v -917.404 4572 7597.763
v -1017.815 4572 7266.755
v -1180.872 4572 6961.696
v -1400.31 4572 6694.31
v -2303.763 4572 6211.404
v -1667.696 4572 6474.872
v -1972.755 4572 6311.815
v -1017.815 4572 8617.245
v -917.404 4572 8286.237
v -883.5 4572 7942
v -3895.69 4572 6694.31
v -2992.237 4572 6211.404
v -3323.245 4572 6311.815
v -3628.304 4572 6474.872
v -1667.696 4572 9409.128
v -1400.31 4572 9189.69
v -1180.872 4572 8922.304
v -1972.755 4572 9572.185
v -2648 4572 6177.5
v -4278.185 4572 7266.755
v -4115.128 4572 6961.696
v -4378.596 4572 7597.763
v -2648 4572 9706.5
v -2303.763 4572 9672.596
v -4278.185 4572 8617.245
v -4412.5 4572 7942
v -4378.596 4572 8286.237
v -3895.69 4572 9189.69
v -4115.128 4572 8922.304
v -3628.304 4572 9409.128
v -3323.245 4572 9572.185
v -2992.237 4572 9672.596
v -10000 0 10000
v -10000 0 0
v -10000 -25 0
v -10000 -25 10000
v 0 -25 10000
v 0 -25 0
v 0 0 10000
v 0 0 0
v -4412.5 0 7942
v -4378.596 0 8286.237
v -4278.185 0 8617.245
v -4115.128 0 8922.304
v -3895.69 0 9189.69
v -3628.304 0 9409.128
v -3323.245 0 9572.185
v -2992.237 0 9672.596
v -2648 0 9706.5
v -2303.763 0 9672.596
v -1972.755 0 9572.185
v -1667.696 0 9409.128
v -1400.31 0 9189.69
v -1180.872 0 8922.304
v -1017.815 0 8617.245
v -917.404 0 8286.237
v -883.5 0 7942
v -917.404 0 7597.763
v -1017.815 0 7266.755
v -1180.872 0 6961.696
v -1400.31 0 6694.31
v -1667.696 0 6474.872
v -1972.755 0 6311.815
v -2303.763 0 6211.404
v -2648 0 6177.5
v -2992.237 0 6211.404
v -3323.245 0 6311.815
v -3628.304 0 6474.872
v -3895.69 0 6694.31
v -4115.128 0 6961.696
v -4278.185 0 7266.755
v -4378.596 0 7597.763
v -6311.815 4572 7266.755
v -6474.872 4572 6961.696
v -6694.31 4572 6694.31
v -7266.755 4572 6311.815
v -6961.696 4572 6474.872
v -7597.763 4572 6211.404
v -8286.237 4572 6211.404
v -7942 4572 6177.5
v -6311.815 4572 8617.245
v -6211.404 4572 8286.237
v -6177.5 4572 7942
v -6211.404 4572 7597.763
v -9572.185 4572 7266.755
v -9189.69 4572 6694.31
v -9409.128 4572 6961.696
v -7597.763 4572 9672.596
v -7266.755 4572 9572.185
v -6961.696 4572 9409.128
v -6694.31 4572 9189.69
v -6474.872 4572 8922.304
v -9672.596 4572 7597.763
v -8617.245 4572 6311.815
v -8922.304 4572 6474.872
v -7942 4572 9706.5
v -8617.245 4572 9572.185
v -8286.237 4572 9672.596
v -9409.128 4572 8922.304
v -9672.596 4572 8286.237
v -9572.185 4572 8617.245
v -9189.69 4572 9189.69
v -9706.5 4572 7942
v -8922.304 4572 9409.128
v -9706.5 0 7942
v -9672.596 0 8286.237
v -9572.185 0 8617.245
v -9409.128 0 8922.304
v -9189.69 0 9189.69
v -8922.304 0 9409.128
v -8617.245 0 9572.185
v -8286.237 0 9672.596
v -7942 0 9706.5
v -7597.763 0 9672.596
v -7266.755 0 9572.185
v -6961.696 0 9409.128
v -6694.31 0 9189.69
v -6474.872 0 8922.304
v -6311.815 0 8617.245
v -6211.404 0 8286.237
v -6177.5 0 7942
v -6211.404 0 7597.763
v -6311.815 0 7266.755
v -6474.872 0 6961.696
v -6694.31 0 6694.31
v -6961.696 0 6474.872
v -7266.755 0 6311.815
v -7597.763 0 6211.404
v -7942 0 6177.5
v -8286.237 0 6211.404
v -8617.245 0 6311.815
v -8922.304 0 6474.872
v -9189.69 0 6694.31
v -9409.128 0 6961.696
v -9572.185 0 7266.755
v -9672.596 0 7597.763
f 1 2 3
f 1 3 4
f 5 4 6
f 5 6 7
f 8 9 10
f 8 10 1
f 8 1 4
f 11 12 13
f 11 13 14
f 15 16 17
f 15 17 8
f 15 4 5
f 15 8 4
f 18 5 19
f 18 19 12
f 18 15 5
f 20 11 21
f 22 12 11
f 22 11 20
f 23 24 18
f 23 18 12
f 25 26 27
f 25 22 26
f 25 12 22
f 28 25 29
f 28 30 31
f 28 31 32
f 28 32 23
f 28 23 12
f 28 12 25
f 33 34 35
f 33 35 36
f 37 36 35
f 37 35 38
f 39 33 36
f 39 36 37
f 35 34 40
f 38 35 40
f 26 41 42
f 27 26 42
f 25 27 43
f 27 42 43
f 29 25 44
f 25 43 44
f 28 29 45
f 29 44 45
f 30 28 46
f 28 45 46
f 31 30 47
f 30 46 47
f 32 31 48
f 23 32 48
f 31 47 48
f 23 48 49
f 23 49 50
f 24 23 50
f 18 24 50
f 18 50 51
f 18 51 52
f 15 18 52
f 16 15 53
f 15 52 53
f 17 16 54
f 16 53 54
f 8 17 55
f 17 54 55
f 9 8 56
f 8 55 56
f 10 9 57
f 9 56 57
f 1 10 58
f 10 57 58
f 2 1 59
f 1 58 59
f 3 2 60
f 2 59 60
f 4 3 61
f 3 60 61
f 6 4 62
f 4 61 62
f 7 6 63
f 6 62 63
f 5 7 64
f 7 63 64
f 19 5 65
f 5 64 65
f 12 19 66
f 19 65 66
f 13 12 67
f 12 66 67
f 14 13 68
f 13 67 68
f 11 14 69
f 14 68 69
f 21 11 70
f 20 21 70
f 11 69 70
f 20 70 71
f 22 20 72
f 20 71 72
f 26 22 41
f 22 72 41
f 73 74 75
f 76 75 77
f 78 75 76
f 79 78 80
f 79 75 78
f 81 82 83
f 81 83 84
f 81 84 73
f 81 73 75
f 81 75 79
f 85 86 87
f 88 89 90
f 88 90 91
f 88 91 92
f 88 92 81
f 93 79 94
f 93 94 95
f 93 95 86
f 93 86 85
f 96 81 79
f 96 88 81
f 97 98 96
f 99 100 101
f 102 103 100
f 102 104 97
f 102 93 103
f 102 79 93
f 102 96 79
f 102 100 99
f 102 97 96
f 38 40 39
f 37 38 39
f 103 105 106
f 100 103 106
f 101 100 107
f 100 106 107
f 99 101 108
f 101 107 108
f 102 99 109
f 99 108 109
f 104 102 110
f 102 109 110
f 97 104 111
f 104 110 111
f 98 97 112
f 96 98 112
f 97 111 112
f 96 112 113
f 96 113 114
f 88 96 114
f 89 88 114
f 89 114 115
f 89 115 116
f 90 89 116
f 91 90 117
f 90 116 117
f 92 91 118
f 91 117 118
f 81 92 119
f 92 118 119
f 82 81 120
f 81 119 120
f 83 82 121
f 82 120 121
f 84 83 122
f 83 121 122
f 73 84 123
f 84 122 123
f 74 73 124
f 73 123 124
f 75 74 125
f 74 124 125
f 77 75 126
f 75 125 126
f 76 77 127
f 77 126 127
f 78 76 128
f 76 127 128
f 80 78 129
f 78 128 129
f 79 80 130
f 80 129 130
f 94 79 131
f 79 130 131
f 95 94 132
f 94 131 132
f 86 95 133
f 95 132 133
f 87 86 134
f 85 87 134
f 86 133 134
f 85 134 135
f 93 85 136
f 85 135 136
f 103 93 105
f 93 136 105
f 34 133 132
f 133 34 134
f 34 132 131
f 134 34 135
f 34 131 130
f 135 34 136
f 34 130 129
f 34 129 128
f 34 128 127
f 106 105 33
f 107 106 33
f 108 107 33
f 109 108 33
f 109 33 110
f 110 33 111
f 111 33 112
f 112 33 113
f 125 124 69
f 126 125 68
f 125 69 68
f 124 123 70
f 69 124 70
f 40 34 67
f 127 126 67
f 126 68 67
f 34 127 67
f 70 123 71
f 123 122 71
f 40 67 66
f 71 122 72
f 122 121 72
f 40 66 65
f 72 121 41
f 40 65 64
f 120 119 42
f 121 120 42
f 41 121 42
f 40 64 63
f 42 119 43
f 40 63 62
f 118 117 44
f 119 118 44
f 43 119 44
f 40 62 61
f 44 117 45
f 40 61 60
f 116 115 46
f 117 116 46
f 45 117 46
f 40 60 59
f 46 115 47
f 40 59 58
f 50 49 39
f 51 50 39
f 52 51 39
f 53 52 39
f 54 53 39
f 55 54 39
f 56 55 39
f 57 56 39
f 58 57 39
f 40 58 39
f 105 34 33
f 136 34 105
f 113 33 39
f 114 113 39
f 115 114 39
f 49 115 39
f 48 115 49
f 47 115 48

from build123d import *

# Parameters (mm, degrees)
F0_W     = 10000
F0_H     = 10000
F1_DEPTH = 25
F2_R     = 1764.5
F3_DEPTH = 4572


# Not quite as in the source:
# - a feature names something its author has since deleted; it is built from what else it names


with BuildPart() as f1:
    # F0 (on Front) → F1 (new body)
    with BuildSketch(Plane.XZ):
        with Locations((-5000, 5000)):
            Rectangle(F0_W, F0_H)
    extrude(amount=F1_DEPTH)

    # F2 (on face) → F3 (join)
    with BuildSketch(Plane(origin=(0, 0, 0), x_dir=(-1, 0, 0), z_dir=(0, 1, 0))):
        with Locations((2648, 7942)):
            Circle(F2_R)
        with Locations((7942, 7942)):
            Circle(F2_R)
    extrude(amount=F3_DEPTH)


solid = f1.part
